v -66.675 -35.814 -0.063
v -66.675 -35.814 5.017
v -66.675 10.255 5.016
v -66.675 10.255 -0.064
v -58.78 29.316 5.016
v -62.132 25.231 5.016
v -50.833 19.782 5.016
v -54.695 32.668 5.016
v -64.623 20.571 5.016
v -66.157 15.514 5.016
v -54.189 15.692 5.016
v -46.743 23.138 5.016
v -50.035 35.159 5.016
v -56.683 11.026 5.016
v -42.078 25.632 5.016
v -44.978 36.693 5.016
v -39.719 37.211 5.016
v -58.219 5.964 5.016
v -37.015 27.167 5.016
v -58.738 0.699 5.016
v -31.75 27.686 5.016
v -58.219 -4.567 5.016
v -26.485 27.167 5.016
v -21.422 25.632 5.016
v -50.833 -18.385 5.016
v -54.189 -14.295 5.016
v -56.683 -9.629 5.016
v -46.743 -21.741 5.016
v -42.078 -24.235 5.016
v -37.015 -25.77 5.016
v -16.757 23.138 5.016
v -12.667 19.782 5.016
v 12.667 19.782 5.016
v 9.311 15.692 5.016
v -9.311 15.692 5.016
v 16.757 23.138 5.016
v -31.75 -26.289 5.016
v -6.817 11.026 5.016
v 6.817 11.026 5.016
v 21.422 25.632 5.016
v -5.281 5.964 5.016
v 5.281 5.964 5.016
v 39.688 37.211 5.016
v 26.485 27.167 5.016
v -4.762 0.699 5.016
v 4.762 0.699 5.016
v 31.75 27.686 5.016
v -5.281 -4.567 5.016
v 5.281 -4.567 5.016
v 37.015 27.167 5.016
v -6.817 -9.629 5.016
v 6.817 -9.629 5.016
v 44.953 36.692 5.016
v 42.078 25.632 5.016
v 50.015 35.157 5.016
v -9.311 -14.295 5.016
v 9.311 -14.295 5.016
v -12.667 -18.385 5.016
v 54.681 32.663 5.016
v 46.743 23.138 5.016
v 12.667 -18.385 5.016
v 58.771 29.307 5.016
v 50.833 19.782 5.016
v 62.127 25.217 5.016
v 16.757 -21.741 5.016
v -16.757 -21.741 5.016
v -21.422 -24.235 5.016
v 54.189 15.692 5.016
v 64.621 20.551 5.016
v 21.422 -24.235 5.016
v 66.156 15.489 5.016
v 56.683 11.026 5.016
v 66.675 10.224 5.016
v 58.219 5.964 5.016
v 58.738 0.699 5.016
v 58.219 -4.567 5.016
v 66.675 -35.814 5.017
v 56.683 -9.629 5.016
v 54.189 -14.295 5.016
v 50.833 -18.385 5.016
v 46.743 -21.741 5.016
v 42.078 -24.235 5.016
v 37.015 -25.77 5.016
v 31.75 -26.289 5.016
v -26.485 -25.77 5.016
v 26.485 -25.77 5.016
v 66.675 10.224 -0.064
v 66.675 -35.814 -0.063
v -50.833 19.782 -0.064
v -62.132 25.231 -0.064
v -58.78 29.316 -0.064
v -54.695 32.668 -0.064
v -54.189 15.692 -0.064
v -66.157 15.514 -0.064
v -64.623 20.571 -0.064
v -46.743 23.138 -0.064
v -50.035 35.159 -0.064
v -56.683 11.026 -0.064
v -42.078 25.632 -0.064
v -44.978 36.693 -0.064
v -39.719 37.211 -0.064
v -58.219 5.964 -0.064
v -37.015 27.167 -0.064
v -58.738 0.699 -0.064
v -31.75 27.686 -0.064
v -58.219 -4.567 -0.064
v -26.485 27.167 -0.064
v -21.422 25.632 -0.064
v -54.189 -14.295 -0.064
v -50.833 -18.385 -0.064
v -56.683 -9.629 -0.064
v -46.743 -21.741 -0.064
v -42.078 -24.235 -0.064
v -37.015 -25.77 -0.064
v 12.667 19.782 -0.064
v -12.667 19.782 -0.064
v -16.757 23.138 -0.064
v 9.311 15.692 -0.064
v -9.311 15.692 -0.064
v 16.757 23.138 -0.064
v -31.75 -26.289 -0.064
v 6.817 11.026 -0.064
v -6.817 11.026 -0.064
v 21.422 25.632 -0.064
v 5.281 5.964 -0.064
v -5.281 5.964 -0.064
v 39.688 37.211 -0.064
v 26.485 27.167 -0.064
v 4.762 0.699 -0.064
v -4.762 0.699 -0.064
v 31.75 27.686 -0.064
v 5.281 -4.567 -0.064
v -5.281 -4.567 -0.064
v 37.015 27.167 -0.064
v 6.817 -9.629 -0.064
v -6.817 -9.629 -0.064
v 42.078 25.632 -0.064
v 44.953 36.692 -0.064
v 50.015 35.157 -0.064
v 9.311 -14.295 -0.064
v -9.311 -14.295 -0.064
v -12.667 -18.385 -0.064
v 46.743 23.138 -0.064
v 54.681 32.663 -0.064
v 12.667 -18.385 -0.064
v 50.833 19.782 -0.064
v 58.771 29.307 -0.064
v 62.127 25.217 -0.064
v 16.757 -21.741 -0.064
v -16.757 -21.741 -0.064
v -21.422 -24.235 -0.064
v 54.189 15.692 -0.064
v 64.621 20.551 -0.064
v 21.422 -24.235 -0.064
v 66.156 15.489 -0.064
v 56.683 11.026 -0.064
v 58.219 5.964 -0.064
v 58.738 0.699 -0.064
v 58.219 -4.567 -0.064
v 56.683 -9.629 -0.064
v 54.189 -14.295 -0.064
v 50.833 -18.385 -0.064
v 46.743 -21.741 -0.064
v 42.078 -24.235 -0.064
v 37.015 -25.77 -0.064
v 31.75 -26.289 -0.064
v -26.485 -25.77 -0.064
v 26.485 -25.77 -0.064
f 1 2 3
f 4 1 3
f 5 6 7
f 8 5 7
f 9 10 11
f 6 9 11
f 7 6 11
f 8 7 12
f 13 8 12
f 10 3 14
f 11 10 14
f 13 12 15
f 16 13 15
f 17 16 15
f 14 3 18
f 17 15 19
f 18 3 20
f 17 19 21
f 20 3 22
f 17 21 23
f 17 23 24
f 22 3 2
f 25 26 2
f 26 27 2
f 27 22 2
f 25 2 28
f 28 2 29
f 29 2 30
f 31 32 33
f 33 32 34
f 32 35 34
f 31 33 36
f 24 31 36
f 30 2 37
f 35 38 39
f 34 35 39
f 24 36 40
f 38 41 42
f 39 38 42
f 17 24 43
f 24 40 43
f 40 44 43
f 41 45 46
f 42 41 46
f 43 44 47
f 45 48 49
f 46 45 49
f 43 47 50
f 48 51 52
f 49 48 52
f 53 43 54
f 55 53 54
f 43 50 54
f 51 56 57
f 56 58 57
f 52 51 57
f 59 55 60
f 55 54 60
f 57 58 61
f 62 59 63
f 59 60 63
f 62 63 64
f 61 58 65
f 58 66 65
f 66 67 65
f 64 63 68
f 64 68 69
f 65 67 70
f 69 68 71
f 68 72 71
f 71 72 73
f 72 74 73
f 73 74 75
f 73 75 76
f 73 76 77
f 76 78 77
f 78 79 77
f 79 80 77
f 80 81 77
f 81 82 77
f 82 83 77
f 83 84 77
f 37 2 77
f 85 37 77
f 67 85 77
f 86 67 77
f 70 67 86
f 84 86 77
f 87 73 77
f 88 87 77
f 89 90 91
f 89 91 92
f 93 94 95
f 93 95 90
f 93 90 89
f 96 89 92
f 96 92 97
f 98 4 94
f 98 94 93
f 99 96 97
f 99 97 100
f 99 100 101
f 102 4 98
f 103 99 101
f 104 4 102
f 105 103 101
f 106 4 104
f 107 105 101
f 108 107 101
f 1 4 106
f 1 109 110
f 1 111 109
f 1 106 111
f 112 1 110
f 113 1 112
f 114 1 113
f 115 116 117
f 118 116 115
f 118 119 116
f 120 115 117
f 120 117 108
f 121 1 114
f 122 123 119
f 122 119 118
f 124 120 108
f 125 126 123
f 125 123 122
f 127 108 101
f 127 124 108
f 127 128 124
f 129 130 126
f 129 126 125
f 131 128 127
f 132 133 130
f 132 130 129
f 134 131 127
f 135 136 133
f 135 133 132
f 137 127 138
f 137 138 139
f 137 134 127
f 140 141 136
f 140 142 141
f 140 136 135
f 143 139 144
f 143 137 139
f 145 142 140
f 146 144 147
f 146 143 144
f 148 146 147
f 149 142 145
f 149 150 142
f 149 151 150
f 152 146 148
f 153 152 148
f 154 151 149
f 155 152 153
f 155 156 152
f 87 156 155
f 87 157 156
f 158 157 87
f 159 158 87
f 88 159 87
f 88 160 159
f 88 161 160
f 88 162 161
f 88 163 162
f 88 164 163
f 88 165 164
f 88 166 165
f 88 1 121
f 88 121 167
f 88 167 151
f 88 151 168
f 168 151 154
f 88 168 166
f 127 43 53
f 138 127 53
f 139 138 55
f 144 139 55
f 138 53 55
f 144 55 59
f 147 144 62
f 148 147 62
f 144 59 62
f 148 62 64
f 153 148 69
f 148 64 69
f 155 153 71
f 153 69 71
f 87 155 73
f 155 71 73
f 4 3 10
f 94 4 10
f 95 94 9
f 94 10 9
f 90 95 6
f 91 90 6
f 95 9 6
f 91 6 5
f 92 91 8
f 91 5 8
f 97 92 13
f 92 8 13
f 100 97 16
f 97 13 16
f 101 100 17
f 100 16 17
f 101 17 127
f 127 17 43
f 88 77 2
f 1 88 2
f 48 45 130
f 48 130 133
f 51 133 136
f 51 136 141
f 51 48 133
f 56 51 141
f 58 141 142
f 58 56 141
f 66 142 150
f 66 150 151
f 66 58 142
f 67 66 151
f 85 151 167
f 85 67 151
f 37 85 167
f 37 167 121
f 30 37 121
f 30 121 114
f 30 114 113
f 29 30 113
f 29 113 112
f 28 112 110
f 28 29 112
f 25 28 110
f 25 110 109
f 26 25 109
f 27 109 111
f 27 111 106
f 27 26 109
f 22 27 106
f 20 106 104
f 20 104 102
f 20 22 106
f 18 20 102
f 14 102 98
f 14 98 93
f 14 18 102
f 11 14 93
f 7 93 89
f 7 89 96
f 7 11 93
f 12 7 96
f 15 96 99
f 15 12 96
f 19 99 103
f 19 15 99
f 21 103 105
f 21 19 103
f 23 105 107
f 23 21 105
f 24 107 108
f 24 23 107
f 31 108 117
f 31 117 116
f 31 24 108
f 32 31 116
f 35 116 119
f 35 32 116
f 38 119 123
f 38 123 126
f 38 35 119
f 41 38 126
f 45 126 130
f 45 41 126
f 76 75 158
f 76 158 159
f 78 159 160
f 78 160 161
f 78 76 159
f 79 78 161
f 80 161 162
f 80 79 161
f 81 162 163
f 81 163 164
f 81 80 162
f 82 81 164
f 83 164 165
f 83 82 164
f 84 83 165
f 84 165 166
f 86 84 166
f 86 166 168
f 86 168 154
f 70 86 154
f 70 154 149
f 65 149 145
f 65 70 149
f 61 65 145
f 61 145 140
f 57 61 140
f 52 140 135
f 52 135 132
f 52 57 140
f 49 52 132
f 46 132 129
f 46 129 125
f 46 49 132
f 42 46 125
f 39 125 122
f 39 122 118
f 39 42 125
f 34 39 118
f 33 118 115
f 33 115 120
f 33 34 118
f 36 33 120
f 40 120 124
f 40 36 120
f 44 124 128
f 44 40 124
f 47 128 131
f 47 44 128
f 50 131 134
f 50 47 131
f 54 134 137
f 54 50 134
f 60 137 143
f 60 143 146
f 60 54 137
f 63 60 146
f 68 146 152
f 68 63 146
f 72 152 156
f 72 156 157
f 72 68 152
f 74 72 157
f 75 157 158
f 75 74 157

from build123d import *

# Parameters (mm, degrees)
F0_R     = 26.9875
F1_DEPTH = 5.08
F2_ANGLE = 90


with BuildPart() as f1:
    # F0 (on Front) → F1 (new body)
    with BuildSketch(Plane.XZ):
        with BuildLine():
            Line((66.675, 36.5125), (-66.675, 36.5125))
            Line((-66.675, 36.5125), (-66.675, -9.55675))
            ThreePointArc((-66.675, -9.55675), (-58.779844, -28.617344), (-39.71925, -36.5125))
            Line((-39.71925, -36.5125), (39.6875, -36.5125))
            ThreePointArc((39.6875, -36.5125), (58.770544, -28.608044), (66.675, -9.525))
            Line((66.675, -9.525), (66.675, 36.5125))
        make_face()
        with Locations((-31.75, 0)):
            Circle(F0_R, mode=Mode.SUBTRACT)
        with Locations((31.75, 0)):
            Circle(F0_R, mode=Mode.SUBTRACT)
    extrude(amount=F1_DEPTH)


with BuildPart() as f1_1:
    # F2: moved
    add(f1.part.rotate(Axis((0, 0, 36.5125), (1, 0, 0)), F2_ANGLE))


with BuildPart() as f1_2:
    # F3: moved
    add(f1_1.part.moved(Location((0, -35.814, -31.496))))


solid = f1_2.part
